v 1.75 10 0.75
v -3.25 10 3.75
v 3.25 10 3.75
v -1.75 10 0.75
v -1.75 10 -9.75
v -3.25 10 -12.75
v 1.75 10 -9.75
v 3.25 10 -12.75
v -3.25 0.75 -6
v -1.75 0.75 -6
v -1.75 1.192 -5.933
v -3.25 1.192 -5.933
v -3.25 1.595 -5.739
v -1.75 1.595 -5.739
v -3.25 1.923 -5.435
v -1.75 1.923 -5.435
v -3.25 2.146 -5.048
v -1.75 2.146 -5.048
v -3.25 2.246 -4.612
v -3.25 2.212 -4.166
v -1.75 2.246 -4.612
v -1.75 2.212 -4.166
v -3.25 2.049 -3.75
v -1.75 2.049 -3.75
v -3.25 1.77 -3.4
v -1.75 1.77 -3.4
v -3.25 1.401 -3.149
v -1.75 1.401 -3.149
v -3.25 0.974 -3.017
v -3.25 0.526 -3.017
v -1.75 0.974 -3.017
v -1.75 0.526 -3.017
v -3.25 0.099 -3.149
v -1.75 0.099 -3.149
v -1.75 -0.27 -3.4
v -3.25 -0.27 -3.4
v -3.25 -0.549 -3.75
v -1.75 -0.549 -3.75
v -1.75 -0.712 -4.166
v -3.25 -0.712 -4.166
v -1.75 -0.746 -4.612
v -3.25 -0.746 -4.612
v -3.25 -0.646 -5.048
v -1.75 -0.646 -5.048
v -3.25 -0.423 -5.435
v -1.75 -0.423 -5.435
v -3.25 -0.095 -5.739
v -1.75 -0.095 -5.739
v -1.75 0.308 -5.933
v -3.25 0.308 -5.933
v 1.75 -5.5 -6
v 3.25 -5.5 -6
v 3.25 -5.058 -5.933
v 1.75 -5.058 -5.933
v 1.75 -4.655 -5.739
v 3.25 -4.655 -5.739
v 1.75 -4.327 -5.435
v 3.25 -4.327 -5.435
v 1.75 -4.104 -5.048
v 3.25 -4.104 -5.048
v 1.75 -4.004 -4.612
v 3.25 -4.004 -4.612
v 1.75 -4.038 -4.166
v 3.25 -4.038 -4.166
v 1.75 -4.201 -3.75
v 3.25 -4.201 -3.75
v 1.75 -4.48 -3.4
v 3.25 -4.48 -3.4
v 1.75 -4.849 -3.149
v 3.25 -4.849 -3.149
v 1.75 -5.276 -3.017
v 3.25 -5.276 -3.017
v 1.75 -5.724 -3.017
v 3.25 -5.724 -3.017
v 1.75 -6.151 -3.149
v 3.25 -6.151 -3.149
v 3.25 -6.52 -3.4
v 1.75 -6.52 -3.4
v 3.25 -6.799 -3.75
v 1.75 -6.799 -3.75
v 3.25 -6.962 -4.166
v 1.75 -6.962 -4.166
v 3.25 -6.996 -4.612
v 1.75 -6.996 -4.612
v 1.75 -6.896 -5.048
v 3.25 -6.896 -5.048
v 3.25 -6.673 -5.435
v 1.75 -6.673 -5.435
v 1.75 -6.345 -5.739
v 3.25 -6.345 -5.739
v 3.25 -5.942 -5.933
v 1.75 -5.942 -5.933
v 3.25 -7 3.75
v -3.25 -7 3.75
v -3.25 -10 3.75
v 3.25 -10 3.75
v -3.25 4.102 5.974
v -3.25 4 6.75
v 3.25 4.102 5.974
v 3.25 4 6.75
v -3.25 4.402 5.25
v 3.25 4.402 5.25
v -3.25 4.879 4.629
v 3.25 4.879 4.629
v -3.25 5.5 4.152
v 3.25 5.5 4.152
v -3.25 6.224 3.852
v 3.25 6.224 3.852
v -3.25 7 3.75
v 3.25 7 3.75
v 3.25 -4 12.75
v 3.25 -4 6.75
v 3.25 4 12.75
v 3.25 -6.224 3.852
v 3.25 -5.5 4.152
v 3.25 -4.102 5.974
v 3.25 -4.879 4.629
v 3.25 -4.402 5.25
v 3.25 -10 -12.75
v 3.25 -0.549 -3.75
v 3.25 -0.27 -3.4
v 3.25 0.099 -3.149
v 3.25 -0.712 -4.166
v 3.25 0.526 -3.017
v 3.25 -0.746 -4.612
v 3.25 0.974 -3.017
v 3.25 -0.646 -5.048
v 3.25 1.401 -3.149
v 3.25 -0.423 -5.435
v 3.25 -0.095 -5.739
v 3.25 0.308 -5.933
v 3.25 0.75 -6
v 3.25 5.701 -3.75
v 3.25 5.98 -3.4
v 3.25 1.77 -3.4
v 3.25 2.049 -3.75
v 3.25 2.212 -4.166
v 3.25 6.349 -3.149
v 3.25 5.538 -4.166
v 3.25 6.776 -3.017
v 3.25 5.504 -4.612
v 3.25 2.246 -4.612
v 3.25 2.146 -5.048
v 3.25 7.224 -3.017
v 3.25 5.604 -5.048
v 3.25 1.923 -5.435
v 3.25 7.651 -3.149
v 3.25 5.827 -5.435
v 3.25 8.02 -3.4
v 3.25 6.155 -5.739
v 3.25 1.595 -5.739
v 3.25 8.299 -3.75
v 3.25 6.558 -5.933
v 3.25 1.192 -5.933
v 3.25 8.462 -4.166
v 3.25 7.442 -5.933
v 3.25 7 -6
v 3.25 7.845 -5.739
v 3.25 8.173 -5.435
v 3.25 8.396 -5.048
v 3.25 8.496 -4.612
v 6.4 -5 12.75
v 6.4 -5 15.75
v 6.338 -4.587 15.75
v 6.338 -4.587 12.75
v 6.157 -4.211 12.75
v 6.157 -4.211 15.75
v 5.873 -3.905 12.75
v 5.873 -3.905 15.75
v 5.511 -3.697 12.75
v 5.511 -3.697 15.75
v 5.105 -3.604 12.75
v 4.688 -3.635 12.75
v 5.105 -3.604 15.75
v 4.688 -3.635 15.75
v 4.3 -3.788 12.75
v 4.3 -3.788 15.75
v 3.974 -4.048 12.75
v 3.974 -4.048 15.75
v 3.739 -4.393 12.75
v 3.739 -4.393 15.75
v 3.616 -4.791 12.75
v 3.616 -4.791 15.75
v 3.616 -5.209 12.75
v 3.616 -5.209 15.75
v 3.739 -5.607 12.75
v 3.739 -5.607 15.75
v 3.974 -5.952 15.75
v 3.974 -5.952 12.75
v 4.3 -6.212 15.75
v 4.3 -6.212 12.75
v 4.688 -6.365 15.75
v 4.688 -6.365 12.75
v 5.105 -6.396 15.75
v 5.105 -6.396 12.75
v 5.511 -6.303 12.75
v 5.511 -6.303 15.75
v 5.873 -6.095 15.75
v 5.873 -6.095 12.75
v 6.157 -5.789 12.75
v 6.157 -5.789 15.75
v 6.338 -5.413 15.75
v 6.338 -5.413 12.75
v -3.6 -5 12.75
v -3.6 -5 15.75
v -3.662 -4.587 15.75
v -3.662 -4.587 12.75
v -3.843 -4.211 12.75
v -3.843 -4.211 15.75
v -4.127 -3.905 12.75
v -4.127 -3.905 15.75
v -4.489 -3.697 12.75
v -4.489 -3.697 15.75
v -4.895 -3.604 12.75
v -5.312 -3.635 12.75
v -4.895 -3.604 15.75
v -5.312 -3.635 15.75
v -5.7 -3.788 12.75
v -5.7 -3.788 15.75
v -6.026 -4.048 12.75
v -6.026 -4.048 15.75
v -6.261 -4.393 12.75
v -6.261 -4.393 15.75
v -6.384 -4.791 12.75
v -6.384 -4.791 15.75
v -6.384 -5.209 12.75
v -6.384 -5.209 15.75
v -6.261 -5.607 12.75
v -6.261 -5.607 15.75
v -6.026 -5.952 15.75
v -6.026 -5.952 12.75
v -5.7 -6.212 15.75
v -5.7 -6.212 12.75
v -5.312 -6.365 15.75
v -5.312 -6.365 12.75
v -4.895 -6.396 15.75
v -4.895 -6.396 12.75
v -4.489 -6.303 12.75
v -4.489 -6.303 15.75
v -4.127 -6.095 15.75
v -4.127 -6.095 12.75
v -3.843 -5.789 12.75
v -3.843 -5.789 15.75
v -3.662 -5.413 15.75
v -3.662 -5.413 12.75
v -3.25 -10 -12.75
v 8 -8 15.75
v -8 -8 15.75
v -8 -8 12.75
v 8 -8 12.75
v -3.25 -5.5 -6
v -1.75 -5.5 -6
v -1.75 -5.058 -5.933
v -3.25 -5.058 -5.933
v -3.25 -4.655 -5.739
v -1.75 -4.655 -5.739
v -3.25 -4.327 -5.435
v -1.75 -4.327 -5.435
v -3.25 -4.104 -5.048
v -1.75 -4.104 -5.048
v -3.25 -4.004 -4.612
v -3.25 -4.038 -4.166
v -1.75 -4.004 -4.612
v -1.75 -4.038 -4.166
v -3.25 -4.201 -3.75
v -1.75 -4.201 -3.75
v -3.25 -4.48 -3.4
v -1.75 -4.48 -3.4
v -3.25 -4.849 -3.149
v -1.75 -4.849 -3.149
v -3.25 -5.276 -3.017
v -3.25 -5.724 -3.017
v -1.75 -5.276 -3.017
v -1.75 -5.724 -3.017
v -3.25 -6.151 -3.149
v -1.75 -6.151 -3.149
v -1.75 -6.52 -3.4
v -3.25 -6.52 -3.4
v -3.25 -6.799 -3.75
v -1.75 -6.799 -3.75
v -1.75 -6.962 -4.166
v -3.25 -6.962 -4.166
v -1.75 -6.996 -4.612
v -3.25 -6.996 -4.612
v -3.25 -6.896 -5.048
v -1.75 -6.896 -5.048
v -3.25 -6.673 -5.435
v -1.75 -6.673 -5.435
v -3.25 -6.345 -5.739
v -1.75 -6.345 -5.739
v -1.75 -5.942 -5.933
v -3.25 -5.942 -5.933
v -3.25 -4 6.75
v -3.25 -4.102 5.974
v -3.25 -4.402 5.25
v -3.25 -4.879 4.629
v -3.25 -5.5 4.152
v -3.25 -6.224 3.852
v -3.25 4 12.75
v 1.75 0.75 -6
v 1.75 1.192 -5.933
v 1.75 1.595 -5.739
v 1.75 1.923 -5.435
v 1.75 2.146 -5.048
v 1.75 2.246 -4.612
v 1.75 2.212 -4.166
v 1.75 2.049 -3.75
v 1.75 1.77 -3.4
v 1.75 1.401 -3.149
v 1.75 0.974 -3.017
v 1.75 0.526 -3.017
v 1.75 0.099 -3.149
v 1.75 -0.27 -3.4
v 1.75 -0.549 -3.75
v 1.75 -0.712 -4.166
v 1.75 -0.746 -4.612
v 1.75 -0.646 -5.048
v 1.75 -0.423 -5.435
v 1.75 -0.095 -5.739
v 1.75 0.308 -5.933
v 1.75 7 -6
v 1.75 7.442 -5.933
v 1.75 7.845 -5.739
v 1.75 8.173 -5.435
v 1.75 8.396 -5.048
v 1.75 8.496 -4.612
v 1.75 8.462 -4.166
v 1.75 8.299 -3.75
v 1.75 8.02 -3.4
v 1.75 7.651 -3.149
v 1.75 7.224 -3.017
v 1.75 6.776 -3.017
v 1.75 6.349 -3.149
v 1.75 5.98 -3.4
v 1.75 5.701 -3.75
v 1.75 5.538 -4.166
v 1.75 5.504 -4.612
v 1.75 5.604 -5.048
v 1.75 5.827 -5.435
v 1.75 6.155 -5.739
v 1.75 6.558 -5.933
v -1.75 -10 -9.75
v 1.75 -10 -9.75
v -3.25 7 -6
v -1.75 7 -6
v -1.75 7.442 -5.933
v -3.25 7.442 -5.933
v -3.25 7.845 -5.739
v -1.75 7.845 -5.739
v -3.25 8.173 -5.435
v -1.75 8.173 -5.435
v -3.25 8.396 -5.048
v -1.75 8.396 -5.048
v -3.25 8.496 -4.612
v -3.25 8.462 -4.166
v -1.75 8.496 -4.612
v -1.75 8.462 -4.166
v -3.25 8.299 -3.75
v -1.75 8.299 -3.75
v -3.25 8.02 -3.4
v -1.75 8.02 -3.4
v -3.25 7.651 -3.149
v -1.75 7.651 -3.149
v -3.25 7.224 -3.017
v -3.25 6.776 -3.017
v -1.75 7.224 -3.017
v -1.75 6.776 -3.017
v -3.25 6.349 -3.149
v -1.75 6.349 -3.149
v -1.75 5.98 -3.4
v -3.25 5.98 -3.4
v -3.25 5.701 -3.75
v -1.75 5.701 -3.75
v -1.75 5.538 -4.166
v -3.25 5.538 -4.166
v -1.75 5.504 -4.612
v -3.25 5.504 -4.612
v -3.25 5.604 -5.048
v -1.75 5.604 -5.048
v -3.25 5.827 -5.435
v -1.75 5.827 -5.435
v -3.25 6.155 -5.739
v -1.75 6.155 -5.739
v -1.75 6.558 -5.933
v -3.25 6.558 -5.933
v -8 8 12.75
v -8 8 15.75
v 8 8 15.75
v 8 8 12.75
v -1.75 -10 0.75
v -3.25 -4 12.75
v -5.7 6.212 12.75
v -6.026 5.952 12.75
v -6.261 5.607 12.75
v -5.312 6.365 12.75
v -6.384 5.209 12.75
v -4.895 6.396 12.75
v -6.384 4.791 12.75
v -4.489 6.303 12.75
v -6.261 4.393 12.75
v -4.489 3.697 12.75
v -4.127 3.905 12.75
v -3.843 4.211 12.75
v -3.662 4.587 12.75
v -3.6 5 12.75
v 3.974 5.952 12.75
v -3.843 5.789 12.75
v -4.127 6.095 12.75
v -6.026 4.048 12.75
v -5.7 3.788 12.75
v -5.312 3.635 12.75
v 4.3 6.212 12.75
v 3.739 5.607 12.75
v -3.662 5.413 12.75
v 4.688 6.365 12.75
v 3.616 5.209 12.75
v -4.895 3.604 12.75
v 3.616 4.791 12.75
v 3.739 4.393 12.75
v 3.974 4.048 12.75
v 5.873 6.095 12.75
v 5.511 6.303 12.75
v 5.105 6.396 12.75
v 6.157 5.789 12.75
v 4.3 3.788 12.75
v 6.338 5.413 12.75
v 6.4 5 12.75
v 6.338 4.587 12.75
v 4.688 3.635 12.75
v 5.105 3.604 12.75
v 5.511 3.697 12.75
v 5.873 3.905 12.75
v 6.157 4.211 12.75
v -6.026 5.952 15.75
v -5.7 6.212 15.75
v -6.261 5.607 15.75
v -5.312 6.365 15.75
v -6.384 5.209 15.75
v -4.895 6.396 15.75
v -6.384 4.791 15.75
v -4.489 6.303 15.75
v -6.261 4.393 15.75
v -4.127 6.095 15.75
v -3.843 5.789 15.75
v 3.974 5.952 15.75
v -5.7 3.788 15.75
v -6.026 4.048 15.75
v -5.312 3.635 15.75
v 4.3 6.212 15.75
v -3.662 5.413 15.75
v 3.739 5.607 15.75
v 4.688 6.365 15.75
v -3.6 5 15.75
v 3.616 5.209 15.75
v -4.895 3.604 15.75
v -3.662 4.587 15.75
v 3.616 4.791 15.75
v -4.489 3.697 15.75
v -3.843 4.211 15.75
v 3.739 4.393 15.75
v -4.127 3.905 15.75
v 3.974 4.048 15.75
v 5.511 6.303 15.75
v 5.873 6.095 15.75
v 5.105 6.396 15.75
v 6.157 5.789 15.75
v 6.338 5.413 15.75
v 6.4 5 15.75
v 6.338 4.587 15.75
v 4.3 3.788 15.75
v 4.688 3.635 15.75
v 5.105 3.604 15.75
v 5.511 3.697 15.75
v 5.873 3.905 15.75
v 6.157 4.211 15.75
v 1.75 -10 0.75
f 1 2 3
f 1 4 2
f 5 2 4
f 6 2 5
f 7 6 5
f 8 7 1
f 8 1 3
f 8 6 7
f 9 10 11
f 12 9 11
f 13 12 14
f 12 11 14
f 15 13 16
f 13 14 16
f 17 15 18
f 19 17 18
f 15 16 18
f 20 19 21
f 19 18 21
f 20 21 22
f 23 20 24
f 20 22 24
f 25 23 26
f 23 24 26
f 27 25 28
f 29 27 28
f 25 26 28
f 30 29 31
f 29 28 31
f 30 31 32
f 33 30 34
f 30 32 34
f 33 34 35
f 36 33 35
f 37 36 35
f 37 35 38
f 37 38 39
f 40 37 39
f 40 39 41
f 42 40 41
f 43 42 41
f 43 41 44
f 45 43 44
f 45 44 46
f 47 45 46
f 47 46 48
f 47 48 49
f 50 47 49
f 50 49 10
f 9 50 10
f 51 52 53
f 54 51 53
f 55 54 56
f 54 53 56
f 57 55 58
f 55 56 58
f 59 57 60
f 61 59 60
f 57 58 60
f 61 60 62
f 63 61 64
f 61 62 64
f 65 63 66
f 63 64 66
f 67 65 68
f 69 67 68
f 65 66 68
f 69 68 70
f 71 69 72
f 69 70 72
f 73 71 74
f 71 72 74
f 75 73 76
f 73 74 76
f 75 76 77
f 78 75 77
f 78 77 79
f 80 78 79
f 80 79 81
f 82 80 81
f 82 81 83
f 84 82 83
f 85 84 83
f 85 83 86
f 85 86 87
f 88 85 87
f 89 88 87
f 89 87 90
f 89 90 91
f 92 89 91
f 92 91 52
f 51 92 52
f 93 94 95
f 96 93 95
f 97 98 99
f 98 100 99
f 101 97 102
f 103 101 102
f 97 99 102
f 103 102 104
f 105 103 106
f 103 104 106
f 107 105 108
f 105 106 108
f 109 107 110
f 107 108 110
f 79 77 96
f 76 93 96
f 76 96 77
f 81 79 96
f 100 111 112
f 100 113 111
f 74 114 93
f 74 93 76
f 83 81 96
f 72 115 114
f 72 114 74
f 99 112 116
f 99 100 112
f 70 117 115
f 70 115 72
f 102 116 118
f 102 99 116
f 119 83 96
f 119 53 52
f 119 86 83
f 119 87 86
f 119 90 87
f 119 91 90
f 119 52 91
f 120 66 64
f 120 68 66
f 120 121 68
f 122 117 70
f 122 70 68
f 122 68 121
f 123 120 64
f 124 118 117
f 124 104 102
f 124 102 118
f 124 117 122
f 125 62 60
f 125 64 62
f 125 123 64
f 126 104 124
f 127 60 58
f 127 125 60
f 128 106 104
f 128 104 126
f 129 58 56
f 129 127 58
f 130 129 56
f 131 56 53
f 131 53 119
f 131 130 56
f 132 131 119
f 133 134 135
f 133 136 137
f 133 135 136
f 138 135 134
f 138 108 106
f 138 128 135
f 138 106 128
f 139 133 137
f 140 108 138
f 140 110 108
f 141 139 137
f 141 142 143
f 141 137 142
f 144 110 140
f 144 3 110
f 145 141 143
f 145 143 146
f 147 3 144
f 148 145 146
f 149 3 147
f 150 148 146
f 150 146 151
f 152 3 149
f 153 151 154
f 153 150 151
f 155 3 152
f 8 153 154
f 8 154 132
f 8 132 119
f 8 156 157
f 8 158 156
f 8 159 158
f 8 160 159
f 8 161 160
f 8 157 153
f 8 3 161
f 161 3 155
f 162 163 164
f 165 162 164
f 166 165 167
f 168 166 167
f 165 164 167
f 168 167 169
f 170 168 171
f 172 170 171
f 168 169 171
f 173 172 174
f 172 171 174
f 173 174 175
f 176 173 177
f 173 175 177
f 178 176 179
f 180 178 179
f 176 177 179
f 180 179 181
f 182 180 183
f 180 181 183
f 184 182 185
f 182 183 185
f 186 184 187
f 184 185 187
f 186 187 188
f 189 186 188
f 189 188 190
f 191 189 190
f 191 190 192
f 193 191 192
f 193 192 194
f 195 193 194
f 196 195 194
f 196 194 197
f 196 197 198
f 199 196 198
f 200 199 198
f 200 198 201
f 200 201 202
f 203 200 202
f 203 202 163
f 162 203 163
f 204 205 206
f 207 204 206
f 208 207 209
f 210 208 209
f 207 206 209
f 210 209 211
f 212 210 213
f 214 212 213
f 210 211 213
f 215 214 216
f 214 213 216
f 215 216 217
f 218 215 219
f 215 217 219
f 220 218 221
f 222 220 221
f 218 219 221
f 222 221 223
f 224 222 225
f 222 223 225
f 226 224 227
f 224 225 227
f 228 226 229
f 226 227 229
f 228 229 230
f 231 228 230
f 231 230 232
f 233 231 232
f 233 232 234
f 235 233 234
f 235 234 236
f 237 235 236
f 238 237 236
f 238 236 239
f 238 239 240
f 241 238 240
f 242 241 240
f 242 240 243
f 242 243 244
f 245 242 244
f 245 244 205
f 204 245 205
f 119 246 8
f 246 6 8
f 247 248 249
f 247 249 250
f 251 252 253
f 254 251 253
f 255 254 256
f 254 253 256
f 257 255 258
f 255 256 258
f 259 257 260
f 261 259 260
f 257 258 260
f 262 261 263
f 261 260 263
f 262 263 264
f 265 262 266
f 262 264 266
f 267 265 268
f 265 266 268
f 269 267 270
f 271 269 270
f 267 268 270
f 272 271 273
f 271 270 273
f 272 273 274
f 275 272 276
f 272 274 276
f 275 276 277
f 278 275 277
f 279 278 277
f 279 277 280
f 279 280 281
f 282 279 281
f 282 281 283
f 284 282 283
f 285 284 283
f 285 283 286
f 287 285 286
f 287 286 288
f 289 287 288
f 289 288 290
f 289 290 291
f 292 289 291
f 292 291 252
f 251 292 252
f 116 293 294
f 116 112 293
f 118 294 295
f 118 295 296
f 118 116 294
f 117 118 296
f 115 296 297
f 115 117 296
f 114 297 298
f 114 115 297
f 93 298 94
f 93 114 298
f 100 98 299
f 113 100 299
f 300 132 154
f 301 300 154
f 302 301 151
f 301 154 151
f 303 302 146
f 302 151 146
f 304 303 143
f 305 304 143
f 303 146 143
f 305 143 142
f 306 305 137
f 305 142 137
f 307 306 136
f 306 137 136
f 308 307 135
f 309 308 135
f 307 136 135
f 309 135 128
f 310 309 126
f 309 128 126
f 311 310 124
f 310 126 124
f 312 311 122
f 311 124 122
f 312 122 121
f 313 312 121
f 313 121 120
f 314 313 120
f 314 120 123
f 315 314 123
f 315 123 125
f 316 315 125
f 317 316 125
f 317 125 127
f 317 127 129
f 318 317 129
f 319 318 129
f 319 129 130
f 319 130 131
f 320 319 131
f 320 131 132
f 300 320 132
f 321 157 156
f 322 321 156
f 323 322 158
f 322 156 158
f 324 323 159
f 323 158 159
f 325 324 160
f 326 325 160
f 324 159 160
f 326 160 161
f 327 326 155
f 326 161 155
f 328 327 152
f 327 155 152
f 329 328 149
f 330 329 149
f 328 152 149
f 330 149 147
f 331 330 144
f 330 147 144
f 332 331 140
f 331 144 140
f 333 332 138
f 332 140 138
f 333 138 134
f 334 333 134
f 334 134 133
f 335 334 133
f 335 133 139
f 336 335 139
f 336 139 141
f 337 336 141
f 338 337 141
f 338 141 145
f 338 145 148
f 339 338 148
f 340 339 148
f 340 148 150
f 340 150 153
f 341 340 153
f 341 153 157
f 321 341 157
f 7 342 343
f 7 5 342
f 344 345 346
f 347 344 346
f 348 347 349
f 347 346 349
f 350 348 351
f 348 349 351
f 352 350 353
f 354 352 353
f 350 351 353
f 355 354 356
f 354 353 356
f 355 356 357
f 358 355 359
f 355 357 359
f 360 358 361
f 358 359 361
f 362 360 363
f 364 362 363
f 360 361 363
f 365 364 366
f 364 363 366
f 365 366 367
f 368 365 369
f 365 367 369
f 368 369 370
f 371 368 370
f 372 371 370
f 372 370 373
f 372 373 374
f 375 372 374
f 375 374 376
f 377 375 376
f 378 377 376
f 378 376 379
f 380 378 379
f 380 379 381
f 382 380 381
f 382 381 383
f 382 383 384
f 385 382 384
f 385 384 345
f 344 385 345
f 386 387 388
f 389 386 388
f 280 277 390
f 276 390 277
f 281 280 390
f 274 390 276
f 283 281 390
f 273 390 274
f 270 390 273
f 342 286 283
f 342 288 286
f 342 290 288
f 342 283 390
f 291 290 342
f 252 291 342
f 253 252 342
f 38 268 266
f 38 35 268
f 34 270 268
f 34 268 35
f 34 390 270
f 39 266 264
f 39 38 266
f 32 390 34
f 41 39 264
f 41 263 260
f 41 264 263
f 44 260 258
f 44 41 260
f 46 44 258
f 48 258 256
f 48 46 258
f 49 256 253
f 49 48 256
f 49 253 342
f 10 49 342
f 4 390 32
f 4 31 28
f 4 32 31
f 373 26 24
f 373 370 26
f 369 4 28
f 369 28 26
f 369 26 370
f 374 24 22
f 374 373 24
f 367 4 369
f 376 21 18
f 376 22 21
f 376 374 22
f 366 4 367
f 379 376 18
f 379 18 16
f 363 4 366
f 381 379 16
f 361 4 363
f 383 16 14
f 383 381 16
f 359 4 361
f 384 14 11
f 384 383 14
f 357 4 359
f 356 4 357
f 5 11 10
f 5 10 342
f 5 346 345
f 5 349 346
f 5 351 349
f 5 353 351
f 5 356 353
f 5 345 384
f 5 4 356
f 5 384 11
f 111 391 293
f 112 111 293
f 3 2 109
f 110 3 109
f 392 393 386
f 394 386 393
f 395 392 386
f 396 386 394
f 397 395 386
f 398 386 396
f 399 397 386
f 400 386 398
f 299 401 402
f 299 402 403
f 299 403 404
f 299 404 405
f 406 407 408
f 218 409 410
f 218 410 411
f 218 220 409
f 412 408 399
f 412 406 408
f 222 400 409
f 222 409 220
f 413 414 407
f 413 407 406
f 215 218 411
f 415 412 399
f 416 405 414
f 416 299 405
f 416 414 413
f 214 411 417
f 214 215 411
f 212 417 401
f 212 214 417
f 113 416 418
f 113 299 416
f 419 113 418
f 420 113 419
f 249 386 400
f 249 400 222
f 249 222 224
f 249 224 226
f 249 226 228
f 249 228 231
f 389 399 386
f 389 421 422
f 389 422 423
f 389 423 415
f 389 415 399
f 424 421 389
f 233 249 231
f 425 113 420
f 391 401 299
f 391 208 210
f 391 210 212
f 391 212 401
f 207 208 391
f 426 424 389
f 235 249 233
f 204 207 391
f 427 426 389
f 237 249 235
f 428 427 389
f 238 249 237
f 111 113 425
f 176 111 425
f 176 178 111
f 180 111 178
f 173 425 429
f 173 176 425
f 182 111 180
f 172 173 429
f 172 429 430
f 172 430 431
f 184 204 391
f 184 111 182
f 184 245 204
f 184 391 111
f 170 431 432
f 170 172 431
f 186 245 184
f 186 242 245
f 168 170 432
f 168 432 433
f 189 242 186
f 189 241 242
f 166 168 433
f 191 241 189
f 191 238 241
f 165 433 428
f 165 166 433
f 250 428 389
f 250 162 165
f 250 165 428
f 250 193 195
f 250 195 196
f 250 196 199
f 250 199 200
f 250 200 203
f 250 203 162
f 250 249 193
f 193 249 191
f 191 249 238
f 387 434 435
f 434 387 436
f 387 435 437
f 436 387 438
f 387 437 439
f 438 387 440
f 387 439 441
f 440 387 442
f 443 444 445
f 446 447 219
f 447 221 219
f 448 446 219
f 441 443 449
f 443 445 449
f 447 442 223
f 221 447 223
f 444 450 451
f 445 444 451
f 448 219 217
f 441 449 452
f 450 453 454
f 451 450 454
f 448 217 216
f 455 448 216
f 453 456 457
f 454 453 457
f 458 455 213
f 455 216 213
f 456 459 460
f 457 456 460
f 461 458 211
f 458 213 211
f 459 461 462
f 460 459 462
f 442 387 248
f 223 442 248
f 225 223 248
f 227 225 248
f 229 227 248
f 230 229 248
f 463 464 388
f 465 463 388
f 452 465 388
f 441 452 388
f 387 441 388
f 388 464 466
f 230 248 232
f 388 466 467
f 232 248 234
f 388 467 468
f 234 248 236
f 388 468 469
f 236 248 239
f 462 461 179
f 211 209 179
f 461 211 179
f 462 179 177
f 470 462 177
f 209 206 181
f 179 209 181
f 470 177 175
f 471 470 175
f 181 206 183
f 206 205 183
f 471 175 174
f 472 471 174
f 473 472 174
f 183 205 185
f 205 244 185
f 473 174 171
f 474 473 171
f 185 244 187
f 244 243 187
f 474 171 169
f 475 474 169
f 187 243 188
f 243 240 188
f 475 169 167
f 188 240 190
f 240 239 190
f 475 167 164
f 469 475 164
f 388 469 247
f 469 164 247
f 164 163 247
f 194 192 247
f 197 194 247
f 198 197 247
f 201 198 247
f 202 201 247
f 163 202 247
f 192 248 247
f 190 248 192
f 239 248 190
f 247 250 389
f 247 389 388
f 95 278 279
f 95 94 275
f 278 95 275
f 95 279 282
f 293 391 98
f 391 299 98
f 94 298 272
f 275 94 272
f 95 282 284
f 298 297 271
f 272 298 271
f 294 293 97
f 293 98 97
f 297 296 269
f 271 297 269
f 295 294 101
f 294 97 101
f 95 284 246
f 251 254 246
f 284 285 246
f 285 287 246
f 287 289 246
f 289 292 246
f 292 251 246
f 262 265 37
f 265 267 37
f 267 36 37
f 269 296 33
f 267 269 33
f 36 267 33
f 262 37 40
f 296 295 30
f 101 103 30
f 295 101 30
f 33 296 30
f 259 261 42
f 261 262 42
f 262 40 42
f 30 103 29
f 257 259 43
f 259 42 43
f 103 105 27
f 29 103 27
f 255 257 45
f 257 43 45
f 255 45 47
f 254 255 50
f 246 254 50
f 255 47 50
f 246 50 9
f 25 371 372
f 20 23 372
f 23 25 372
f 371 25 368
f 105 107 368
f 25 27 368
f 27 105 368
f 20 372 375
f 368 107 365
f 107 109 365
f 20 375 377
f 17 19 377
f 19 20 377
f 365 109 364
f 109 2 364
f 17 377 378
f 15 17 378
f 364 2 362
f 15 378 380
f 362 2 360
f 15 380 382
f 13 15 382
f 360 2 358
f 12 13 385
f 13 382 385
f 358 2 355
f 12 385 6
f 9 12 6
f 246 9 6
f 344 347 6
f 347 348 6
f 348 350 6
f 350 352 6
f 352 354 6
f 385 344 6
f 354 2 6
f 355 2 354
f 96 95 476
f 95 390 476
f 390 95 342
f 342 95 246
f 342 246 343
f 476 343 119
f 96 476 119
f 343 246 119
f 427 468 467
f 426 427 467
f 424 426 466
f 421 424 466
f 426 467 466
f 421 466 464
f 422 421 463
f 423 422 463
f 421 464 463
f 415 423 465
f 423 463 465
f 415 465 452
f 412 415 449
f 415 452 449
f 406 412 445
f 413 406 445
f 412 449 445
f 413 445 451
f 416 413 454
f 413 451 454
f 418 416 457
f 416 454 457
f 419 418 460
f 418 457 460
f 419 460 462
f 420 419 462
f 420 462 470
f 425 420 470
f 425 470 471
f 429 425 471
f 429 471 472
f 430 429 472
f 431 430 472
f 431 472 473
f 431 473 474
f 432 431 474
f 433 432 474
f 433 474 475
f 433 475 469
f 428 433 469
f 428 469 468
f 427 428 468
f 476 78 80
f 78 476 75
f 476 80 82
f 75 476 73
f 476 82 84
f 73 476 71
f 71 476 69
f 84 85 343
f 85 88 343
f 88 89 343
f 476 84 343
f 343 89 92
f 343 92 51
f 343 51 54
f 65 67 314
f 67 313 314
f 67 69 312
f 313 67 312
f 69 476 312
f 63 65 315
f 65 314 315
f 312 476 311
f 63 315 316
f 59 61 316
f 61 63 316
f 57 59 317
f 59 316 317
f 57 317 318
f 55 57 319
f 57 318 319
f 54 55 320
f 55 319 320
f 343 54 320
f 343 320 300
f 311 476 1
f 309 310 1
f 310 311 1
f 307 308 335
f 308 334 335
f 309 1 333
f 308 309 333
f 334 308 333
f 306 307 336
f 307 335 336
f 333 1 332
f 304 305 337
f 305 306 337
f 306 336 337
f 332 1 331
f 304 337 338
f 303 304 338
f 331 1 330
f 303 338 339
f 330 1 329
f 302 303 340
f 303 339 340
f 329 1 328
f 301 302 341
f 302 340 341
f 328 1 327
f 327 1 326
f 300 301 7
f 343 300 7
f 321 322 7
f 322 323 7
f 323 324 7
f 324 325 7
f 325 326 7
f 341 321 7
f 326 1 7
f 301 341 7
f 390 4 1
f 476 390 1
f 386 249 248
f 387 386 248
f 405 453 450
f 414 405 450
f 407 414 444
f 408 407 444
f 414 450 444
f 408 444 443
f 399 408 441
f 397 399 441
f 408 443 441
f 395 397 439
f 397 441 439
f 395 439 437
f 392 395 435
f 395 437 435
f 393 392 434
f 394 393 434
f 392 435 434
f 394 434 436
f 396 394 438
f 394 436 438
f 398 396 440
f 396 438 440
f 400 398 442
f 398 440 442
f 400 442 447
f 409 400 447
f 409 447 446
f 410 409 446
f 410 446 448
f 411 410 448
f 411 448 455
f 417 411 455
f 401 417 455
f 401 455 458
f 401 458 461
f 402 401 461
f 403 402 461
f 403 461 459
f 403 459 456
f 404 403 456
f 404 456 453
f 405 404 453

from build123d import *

# Parameters (mm, degrees)
SKETCH1_W           = 6.5
SKETCH1_H           = 25.5
SKETCH1_W_2         = 3.5
SKETCH1_H_2         = 10.5
BOSS_EXTRUDE1_DEPTH = 10
SKETCH2_W           = 16
SKETCH2_H           = 3
BOSS_EXTRUDE2_DEPTH = 8
CUT_EXTRUDE1_REACH  = 23.786
CUT_EXTRUDE2_REACH  = 33.245
SKETCH4_R           = 1.4
FILLET1_R           = 3
SKETCH6_R           = 1.5
CUT_EXTRUDE4_DEPTH  = 22.785889929


with BuildPart() as part:
    # Sketch1 → Boss-Extrude1 (new, symmetric)
    with BuildSketch(Plane(origin=(0, 0, 0), x_dir=(1, 0, 0), z_dir=(0, 1, 0))):
        Rectangle(SKETCH1_W, SKETCH1_H)
        with Locations((0, 4.5)):
            Rectangle(SKETCH1_W_2, SKETCH1_H_2, mode=Mode.SUBTRACT)
    extrude(amount=BOSS_EXTRUDE1_DEPTH, both=True)

    # Sketch2 → Boss-Extrude2 (add, symmetric)
    with BuildSketch(Plane.XZ):
        with Locations((0, 14.25)):
            Rectangle(SKETCH2_W, SKETCH2_H)
    extrude(amount=BOSS_EXTRUDE2_DEPTH, both=True)

    # Sketch3 → Cut-Extrude1 (cut, up to next)
    with BuildSketch(Plane.ZY.offset(3.25), mode=Mode.PRIVATE) as cut_extrude1_sk1:
        Polygon((12.75, -4), (3.75, -4), (3.75, -10), (12.75, -10), (12.75, -8), align=None)
    cut_extrude1_tool1 = extrude(cut_extrude1_sk1.sketch, amount=-CUT_EXTRUDE1_REACH, mode=Mode.PRIVATE) & part.part
    # Sketch3 → Cut-Extrude1 (cut, up to next)
    with BuildSketch(Plane.ZY.offset(3.25), mode=Mode.PRIVATE) as cut_extrude1_sk2:
        Polygon((12.75, 8), (12.75, 10), (3.75, 10), (3.75, 4), (12.75, 4), align=None)
    cut_extrude1_tool2 = extrude(cut_extrude1_sk2.sketch, amount=-CUT_EXTRUDE1_REACH, mode=Mode.PRIVATE) & part.part
    add(cut_extrude1_tool1.solids().sort_by_distance((-3.25, -7, 8.25))[0], mode=Mode.SUBTRACT)
    add(cut_extrude1_tool2.solids().sort_by_distance((-3.25, 7, 8.25))[0], mode=Mode.SUBTRACT)

    # Sketch4 → Cut-Extrude2 (cut, up to next)
    with BuildSketch(Plane.XY.offset(15.75), mode=Mode.PRIVATE) as cut_extrude2_sk1:
        with Locations((5, -5)):
            Circle(SKETCH4_R)
    cut_extrude2_tool1 = extrude(cut_extrude2_sk1.sketch, amount=-CUT_EXTRUDE2_REACH, mode=Mode.PRIVATE) & part.part
    # Sketch4 → Cut-Extrude2 (cut, up to next)
    with BuildSketch(Plane.XY.offset(15.75), mode=Mode.PRIVATE) as cut_extrude2_sk2:
        with Locations((5, 5)):
            Circle(SKETCH4_R)
    cut_extrude2_tool2 = extrude(cut_extrude2_sk2.sketch, amount=-CUT_EXTRUDE2_REACH, mode=Mode.PRIVATE) & part.part
    # Sketch4 → Cut-Extrude2 (cut, up to next)
    with BuildSketch(Plane.XY.offset(15.75), mode=Mode.PRIVATE) as cut_extrude2_sk3:
        with Locations((-5, 5)):
            Circle(SKETCH4_R)
    cut_extrude2_tool3 = extrude(cut_extrude2_sk3.sketch, amount=-CUT_EXTRUDE2_REACH, mode=Mode.PRIVATE) & part.part
    # Sketch4 → Cut-Extrude2 (cut, up to next)
    with BuildSketch(Plane.XY.offset(15.75), mode=Mode.PRIVATE) as cut_extrude2_sk4:
        with Locations((-5, -5)):
            Circle(SKETCH4_R)
    cut_extrude2_tool4 = extrude(cut_extrude2_sk4.sketch, amount=-CUT_EXTRUDE2_REACH, mode=Mode.PRIVATE) & part.part
    add(cut_extrude2_tool1.solids().sort_by_distance((5, -5, 15.75))[0], mode=Mode.SUBTRACT)
    add(cut_extrude2_tool2.solids().sort_by_distance((5, 5, 15.75))[0], mode=Mode.SUBTRACT)
    add(cut_extrude2_tool3.solids().sort_by_distance((-5, 5, 15.75))[0], mode=Mode.SUBTRACT)
    add(cut_extrude2_tool4.solids().sort_by_distance((-5, -5, 15.75))[0], mode=Mode.SUBTRACT)

    # Fillet1
    fillet1_edges = [part.edges().sort_by_distance(p)[0] for p in [
        (0, -4, 3.75),
        (0, 4, 3.75),
    ]]
    fillet(fillet1_edges, radius=FILLET1_R)

    # Sketch6 → Cut-Extrude4 (cut, through all)
    with BuildSketch(Plane(origin=(3.25, 0, 0), x_dir=(0, 0, -1), z_dir=(1, 0, 0))):
        with Locations((4.5, 7)):
            Circle(SKETCH6_R)
        with Locations((4.5, -5.5)):
            Circle(SKETCH6_R)
        with Locations((4.5, 0.75)):
            Circle(SKETCH6_R)
    extrude(amount=-CUT_EXTRUDE4_DEPTH, mode=Mode.SUBTRACT)


solid = part.part
